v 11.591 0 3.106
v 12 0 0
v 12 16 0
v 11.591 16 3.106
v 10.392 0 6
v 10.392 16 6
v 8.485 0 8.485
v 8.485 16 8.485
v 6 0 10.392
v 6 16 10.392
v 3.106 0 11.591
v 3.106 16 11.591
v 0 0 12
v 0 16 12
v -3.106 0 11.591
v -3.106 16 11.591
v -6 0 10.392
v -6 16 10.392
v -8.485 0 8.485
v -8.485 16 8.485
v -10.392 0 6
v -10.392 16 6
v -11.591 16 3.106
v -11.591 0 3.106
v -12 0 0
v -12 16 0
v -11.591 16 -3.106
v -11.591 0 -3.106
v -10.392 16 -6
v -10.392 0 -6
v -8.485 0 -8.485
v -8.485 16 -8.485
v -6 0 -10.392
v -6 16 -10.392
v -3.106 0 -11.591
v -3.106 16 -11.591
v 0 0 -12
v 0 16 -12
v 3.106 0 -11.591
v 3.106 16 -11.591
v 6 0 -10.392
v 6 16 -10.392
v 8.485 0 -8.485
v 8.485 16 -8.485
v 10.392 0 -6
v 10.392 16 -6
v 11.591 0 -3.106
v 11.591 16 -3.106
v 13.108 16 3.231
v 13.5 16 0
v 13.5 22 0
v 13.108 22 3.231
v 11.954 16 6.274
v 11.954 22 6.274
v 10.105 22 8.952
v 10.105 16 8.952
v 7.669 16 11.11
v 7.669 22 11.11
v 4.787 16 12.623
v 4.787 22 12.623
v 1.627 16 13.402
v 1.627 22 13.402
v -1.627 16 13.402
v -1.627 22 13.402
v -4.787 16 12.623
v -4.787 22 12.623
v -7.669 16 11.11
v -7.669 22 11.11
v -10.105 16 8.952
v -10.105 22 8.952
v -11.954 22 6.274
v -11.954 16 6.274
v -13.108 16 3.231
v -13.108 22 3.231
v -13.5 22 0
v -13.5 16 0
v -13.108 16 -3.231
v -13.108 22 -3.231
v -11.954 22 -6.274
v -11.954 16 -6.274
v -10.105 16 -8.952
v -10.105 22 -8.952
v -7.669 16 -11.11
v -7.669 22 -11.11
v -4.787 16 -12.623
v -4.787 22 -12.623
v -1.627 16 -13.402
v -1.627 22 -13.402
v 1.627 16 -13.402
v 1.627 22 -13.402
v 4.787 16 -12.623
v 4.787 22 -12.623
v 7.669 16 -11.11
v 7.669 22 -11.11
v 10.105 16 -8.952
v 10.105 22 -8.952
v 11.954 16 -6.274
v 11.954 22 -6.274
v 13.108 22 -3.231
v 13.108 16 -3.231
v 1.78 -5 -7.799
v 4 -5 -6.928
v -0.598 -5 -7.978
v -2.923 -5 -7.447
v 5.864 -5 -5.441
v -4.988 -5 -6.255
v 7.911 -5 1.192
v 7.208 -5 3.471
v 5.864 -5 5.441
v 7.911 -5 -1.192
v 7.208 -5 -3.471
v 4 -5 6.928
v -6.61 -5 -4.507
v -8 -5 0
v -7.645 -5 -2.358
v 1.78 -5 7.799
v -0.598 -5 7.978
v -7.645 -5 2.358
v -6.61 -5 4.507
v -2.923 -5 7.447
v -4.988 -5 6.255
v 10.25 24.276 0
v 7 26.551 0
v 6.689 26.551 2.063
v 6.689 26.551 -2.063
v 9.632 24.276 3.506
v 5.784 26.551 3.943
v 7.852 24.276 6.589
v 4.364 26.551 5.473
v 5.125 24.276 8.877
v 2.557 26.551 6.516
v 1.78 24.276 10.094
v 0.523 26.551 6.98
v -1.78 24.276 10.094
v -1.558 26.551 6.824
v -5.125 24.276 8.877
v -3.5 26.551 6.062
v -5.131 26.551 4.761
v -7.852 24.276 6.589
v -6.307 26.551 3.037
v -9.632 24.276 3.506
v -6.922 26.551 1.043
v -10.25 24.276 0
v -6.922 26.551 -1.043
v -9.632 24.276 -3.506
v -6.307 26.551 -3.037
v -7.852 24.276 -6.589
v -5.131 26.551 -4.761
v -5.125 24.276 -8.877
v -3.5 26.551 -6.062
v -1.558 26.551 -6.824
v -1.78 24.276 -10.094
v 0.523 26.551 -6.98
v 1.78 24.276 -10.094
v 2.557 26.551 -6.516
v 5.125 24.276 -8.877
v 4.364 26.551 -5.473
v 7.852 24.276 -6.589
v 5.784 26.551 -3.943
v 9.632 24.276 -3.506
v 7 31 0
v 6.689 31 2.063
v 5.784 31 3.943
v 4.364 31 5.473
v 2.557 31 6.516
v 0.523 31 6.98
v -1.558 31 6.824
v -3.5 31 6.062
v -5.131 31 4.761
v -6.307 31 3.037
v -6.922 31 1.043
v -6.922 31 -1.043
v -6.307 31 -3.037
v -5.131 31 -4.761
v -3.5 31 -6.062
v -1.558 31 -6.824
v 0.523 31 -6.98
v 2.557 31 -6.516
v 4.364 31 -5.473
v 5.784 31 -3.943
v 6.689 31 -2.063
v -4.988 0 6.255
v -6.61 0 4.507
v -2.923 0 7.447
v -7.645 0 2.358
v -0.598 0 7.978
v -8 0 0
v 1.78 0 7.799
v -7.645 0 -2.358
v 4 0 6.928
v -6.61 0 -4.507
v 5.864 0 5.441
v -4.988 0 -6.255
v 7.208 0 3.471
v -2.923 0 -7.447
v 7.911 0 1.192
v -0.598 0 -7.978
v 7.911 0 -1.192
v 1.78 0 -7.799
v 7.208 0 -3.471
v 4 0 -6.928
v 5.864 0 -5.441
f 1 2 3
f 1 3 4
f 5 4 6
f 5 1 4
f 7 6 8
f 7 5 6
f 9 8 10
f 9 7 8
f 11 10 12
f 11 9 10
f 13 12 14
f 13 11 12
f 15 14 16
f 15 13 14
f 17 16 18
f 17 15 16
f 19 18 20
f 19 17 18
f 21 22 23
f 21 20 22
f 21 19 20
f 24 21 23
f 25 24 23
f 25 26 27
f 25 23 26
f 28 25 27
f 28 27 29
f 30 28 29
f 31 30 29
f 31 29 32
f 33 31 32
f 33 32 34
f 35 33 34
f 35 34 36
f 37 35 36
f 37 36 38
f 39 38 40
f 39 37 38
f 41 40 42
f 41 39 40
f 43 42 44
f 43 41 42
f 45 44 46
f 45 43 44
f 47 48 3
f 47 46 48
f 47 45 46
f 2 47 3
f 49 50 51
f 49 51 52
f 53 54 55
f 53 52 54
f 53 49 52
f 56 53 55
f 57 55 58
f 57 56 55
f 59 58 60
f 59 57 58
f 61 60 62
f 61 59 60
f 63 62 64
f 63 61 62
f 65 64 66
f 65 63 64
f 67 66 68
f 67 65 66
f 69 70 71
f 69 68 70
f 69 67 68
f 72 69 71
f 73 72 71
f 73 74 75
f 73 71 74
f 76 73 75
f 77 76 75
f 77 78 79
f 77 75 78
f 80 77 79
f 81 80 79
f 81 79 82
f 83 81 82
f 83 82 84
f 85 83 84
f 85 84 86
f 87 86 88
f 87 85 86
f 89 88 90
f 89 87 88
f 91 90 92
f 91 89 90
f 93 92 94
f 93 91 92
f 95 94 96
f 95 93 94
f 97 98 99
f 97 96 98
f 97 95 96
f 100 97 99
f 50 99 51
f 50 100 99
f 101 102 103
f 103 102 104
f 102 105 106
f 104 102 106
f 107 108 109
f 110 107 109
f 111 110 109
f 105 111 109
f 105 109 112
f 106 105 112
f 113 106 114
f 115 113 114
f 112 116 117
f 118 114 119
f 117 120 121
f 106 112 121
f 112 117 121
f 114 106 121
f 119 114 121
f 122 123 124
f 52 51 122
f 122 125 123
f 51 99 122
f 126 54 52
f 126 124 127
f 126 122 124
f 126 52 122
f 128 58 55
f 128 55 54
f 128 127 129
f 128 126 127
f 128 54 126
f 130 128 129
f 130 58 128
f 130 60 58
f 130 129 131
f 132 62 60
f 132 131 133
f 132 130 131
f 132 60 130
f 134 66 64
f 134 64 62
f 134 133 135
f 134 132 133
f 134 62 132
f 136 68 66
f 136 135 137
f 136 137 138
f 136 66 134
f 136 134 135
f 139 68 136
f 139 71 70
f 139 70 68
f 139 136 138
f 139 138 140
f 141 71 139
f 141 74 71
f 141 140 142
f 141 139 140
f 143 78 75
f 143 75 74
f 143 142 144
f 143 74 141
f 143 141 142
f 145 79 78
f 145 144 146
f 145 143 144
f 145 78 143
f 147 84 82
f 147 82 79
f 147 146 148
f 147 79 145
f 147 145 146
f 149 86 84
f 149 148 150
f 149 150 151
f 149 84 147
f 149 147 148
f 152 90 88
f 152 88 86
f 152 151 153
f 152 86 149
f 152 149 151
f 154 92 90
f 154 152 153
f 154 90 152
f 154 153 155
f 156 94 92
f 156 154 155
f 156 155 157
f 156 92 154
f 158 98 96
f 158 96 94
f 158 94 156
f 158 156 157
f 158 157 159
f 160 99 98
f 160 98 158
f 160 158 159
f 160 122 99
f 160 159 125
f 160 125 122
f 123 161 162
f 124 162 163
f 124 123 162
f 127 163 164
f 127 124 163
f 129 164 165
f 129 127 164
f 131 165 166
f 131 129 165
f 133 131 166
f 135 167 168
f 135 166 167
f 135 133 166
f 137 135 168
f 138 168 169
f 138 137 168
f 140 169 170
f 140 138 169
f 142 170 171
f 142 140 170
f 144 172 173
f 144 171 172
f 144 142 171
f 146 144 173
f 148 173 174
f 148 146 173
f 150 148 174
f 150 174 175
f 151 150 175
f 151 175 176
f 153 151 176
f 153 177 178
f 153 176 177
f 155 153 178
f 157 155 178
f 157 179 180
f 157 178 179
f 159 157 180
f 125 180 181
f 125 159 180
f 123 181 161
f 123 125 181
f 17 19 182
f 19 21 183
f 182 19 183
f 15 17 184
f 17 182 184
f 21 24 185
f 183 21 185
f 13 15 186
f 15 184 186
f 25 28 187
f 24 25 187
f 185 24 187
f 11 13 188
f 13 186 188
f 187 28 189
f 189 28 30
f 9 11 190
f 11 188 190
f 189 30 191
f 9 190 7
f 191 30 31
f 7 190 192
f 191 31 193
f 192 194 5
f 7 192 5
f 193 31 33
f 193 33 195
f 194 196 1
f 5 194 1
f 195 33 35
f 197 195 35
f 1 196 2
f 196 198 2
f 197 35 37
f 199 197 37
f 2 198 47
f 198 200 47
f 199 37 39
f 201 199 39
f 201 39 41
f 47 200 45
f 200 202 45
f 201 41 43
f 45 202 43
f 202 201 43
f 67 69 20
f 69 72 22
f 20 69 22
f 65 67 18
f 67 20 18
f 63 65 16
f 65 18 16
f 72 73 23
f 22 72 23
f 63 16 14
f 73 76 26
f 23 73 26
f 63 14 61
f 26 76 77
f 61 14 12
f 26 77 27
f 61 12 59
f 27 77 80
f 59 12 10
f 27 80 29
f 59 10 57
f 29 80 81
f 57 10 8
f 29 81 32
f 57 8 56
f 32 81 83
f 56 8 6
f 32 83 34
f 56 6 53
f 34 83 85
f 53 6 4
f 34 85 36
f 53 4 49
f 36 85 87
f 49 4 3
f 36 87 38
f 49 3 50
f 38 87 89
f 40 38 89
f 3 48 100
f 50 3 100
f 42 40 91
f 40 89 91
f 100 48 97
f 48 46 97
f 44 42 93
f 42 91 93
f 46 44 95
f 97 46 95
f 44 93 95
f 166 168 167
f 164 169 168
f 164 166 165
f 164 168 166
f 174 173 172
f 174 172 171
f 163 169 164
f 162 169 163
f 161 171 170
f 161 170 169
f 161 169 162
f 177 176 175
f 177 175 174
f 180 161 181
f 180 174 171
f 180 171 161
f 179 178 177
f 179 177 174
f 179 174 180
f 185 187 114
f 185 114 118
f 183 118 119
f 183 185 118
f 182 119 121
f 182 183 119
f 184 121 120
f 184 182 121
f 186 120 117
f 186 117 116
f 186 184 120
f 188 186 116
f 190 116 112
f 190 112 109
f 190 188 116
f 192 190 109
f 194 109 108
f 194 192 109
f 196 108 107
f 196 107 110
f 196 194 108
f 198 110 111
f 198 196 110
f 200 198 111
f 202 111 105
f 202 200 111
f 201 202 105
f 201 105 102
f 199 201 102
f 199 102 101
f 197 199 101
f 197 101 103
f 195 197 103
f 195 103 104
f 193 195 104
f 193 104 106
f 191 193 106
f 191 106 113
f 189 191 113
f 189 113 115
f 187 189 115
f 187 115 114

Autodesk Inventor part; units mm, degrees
ref_plane "YZ Plane" through (0, 0, 0) normal (1, 0, 0) x (0, 1, 0)
ref_plane "XZ Plane" through (0, 0, 0) normal (0, 1, 0) x (-1, 0, 0)
ref_plane "XY Plane" through (0, 0, 0) normal (0, 0, 1) x (1, 0, 0)
sketch "Sketch1" plane through (0, 0, 0) normal (0, 1, 0) x (-1, 0, 0)
  circle A0 centre (0, 0) radius 8
  dimension "d0" = 16
extrude "Extrusion1" add sketch "Sketch1" against normal blind 5
sketch "Sketch2" plane through (0, 0, 0) normal (0, 1, 0) x (1, 0, 0)
  circle A0 centre (0, 0) radius 12
  dimension "d3" = 24
extrude "Extrusion2" add sketch "Sketch2" along normal blind 16
sketch "Sketch3" plane through (0, 16, 0) normal (0, 1, 0) x (1, 0, 0)
  circle A0 centre (0, 0) radius 12 projected
  circle A1 centre (0, 0) radius 13.5
  dimension "d6" = 1.5
extrude "Extrusion3" add sketch "Sketch3" along normal blind 6 contours A0 | A1
sketch "Sketch4" plane through (0, 22, 0) normal (0, 1, 0) x (1, 0, 0)
  circle A0 centre (0, 0) radius 7
  dimension "d9" = 14
extrude "Extrusion4" add sketch "Sketch4" along normal blind 9
sketch "Sketch5" plane through (0, 22, 0) normal (0, 1, 0) x (1, 0, 0)
  circle A0 centre (0, 0) radius 13.5 projected
extrude "Extrusion5" add sketch "Sketch5" along normal blind 6.75 draft -55
properties part number "OXYGEN SENSOR"
